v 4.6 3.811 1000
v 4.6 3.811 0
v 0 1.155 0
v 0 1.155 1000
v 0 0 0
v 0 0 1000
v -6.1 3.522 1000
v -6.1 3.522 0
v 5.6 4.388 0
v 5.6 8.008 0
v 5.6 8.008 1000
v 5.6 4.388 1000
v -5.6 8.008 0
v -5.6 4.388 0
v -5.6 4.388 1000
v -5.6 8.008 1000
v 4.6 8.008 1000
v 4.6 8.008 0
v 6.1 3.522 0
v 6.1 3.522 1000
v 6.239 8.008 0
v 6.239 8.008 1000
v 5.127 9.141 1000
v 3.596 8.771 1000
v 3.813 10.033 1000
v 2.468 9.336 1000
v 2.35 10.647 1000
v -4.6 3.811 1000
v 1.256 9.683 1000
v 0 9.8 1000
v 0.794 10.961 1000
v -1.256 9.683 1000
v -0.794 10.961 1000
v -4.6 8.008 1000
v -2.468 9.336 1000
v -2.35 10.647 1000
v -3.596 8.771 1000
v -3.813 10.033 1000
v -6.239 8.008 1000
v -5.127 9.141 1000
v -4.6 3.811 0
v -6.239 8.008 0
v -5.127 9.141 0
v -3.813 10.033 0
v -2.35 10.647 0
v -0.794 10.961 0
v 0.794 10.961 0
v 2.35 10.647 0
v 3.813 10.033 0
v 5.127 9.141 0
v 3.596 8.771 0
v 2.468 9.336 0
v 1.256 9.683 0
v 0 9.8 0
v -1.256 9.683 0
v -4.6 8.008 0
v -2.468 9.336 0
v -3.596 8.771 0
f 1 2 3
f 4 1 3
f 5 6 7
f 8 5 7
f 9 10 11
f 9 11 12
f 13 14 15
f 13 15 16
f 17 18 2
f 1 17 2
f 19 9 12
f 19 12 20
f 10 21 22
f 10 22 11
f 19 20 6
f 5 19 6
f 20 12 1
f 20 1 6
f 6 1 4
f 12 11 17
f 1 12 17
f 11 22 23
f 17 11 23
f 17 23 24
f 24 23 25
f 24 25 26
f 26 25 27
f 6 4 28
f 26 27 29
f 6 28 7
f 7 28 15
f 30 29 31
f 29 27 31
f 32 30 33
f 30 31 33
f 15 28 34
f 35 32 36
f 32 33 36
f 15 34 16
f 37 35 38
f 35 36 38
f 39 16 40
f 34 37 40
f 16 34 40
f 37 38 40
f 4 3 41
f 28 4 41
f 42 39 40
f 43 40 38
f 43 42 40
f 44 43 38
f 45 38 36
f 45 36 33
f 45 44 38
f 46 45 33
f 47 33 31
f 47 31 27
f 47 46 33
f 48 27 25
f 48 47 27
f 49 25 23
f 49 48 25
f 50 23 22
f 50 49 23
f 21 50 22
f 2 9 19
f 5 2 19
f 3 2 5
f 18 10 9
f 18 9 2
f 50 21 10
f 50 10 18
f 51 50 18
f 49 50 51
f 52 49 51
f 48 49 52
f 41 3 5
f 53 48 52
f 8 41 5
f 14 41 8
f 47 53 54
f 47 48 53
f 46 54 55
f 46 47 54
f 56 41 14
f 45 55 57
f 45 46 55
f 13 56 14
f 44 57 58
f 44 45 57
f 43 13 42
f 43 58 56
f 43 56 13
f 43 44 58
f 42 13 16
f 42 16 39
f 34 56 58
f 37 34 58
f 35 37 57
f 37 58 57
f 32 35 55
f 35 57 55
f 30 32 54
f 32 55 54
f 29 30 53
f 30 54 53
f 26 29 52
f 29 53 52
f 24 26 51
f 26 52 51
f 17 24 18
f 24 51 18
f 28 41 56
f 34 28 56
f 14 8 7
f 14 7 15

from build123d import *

# Parameters (mm, degrees)
EXTRUDE_1_DEPTH = 1000


with BuildPart() as part:
    # Эскиз1 → Бобышка-Вытянуть1 (new body)
    with BuildSketch(Plane.XY):
        with BuildLine():
            Line((0, 0), (-6.1, 3.521836642))
            Line((-6.1, 3.521836642), (-5.6, 4.387862046))
            Line((-5.6, 4.387862046), (-5.6, 8.00799361))
            Line((-5.6, 8.00799361), (-6.238589584, 8.00799361))
            ThreePointArc((-6.238589584, 8.00799361), (0, 11), (6.238589584, 8.00799361))
            Line((6.238589584, 8.00799361), (5.6, 8.00799361))
            Line((5.6, 8.00799361), (5.6, 4.387862046))
            Line((5.6, 4.387862046), (6.1, 3.521836642))
            Line((6.1, 3.521836642), (0, 0))
        make_face()
        with BuildLine():
            Line((0, 1.154700538), (-4.6, 3.810511777))
            Line((-4.6, 3.810511777), (-4.6, 8.00799361))
            ThreePointArc((-4.6, 8.00799361), (0, 9.8), (4.6, 8.00799361))
            Line((4.6, 8.00799361), (4.6, 3.810511777))
            Line((4.6, 3.810511777), (0, 1.154700538))
        make_face(mode=Mode.SUBTRACT)
    extrude(amount=EXTRUDE_1_DEPTH)


solid = part.part
